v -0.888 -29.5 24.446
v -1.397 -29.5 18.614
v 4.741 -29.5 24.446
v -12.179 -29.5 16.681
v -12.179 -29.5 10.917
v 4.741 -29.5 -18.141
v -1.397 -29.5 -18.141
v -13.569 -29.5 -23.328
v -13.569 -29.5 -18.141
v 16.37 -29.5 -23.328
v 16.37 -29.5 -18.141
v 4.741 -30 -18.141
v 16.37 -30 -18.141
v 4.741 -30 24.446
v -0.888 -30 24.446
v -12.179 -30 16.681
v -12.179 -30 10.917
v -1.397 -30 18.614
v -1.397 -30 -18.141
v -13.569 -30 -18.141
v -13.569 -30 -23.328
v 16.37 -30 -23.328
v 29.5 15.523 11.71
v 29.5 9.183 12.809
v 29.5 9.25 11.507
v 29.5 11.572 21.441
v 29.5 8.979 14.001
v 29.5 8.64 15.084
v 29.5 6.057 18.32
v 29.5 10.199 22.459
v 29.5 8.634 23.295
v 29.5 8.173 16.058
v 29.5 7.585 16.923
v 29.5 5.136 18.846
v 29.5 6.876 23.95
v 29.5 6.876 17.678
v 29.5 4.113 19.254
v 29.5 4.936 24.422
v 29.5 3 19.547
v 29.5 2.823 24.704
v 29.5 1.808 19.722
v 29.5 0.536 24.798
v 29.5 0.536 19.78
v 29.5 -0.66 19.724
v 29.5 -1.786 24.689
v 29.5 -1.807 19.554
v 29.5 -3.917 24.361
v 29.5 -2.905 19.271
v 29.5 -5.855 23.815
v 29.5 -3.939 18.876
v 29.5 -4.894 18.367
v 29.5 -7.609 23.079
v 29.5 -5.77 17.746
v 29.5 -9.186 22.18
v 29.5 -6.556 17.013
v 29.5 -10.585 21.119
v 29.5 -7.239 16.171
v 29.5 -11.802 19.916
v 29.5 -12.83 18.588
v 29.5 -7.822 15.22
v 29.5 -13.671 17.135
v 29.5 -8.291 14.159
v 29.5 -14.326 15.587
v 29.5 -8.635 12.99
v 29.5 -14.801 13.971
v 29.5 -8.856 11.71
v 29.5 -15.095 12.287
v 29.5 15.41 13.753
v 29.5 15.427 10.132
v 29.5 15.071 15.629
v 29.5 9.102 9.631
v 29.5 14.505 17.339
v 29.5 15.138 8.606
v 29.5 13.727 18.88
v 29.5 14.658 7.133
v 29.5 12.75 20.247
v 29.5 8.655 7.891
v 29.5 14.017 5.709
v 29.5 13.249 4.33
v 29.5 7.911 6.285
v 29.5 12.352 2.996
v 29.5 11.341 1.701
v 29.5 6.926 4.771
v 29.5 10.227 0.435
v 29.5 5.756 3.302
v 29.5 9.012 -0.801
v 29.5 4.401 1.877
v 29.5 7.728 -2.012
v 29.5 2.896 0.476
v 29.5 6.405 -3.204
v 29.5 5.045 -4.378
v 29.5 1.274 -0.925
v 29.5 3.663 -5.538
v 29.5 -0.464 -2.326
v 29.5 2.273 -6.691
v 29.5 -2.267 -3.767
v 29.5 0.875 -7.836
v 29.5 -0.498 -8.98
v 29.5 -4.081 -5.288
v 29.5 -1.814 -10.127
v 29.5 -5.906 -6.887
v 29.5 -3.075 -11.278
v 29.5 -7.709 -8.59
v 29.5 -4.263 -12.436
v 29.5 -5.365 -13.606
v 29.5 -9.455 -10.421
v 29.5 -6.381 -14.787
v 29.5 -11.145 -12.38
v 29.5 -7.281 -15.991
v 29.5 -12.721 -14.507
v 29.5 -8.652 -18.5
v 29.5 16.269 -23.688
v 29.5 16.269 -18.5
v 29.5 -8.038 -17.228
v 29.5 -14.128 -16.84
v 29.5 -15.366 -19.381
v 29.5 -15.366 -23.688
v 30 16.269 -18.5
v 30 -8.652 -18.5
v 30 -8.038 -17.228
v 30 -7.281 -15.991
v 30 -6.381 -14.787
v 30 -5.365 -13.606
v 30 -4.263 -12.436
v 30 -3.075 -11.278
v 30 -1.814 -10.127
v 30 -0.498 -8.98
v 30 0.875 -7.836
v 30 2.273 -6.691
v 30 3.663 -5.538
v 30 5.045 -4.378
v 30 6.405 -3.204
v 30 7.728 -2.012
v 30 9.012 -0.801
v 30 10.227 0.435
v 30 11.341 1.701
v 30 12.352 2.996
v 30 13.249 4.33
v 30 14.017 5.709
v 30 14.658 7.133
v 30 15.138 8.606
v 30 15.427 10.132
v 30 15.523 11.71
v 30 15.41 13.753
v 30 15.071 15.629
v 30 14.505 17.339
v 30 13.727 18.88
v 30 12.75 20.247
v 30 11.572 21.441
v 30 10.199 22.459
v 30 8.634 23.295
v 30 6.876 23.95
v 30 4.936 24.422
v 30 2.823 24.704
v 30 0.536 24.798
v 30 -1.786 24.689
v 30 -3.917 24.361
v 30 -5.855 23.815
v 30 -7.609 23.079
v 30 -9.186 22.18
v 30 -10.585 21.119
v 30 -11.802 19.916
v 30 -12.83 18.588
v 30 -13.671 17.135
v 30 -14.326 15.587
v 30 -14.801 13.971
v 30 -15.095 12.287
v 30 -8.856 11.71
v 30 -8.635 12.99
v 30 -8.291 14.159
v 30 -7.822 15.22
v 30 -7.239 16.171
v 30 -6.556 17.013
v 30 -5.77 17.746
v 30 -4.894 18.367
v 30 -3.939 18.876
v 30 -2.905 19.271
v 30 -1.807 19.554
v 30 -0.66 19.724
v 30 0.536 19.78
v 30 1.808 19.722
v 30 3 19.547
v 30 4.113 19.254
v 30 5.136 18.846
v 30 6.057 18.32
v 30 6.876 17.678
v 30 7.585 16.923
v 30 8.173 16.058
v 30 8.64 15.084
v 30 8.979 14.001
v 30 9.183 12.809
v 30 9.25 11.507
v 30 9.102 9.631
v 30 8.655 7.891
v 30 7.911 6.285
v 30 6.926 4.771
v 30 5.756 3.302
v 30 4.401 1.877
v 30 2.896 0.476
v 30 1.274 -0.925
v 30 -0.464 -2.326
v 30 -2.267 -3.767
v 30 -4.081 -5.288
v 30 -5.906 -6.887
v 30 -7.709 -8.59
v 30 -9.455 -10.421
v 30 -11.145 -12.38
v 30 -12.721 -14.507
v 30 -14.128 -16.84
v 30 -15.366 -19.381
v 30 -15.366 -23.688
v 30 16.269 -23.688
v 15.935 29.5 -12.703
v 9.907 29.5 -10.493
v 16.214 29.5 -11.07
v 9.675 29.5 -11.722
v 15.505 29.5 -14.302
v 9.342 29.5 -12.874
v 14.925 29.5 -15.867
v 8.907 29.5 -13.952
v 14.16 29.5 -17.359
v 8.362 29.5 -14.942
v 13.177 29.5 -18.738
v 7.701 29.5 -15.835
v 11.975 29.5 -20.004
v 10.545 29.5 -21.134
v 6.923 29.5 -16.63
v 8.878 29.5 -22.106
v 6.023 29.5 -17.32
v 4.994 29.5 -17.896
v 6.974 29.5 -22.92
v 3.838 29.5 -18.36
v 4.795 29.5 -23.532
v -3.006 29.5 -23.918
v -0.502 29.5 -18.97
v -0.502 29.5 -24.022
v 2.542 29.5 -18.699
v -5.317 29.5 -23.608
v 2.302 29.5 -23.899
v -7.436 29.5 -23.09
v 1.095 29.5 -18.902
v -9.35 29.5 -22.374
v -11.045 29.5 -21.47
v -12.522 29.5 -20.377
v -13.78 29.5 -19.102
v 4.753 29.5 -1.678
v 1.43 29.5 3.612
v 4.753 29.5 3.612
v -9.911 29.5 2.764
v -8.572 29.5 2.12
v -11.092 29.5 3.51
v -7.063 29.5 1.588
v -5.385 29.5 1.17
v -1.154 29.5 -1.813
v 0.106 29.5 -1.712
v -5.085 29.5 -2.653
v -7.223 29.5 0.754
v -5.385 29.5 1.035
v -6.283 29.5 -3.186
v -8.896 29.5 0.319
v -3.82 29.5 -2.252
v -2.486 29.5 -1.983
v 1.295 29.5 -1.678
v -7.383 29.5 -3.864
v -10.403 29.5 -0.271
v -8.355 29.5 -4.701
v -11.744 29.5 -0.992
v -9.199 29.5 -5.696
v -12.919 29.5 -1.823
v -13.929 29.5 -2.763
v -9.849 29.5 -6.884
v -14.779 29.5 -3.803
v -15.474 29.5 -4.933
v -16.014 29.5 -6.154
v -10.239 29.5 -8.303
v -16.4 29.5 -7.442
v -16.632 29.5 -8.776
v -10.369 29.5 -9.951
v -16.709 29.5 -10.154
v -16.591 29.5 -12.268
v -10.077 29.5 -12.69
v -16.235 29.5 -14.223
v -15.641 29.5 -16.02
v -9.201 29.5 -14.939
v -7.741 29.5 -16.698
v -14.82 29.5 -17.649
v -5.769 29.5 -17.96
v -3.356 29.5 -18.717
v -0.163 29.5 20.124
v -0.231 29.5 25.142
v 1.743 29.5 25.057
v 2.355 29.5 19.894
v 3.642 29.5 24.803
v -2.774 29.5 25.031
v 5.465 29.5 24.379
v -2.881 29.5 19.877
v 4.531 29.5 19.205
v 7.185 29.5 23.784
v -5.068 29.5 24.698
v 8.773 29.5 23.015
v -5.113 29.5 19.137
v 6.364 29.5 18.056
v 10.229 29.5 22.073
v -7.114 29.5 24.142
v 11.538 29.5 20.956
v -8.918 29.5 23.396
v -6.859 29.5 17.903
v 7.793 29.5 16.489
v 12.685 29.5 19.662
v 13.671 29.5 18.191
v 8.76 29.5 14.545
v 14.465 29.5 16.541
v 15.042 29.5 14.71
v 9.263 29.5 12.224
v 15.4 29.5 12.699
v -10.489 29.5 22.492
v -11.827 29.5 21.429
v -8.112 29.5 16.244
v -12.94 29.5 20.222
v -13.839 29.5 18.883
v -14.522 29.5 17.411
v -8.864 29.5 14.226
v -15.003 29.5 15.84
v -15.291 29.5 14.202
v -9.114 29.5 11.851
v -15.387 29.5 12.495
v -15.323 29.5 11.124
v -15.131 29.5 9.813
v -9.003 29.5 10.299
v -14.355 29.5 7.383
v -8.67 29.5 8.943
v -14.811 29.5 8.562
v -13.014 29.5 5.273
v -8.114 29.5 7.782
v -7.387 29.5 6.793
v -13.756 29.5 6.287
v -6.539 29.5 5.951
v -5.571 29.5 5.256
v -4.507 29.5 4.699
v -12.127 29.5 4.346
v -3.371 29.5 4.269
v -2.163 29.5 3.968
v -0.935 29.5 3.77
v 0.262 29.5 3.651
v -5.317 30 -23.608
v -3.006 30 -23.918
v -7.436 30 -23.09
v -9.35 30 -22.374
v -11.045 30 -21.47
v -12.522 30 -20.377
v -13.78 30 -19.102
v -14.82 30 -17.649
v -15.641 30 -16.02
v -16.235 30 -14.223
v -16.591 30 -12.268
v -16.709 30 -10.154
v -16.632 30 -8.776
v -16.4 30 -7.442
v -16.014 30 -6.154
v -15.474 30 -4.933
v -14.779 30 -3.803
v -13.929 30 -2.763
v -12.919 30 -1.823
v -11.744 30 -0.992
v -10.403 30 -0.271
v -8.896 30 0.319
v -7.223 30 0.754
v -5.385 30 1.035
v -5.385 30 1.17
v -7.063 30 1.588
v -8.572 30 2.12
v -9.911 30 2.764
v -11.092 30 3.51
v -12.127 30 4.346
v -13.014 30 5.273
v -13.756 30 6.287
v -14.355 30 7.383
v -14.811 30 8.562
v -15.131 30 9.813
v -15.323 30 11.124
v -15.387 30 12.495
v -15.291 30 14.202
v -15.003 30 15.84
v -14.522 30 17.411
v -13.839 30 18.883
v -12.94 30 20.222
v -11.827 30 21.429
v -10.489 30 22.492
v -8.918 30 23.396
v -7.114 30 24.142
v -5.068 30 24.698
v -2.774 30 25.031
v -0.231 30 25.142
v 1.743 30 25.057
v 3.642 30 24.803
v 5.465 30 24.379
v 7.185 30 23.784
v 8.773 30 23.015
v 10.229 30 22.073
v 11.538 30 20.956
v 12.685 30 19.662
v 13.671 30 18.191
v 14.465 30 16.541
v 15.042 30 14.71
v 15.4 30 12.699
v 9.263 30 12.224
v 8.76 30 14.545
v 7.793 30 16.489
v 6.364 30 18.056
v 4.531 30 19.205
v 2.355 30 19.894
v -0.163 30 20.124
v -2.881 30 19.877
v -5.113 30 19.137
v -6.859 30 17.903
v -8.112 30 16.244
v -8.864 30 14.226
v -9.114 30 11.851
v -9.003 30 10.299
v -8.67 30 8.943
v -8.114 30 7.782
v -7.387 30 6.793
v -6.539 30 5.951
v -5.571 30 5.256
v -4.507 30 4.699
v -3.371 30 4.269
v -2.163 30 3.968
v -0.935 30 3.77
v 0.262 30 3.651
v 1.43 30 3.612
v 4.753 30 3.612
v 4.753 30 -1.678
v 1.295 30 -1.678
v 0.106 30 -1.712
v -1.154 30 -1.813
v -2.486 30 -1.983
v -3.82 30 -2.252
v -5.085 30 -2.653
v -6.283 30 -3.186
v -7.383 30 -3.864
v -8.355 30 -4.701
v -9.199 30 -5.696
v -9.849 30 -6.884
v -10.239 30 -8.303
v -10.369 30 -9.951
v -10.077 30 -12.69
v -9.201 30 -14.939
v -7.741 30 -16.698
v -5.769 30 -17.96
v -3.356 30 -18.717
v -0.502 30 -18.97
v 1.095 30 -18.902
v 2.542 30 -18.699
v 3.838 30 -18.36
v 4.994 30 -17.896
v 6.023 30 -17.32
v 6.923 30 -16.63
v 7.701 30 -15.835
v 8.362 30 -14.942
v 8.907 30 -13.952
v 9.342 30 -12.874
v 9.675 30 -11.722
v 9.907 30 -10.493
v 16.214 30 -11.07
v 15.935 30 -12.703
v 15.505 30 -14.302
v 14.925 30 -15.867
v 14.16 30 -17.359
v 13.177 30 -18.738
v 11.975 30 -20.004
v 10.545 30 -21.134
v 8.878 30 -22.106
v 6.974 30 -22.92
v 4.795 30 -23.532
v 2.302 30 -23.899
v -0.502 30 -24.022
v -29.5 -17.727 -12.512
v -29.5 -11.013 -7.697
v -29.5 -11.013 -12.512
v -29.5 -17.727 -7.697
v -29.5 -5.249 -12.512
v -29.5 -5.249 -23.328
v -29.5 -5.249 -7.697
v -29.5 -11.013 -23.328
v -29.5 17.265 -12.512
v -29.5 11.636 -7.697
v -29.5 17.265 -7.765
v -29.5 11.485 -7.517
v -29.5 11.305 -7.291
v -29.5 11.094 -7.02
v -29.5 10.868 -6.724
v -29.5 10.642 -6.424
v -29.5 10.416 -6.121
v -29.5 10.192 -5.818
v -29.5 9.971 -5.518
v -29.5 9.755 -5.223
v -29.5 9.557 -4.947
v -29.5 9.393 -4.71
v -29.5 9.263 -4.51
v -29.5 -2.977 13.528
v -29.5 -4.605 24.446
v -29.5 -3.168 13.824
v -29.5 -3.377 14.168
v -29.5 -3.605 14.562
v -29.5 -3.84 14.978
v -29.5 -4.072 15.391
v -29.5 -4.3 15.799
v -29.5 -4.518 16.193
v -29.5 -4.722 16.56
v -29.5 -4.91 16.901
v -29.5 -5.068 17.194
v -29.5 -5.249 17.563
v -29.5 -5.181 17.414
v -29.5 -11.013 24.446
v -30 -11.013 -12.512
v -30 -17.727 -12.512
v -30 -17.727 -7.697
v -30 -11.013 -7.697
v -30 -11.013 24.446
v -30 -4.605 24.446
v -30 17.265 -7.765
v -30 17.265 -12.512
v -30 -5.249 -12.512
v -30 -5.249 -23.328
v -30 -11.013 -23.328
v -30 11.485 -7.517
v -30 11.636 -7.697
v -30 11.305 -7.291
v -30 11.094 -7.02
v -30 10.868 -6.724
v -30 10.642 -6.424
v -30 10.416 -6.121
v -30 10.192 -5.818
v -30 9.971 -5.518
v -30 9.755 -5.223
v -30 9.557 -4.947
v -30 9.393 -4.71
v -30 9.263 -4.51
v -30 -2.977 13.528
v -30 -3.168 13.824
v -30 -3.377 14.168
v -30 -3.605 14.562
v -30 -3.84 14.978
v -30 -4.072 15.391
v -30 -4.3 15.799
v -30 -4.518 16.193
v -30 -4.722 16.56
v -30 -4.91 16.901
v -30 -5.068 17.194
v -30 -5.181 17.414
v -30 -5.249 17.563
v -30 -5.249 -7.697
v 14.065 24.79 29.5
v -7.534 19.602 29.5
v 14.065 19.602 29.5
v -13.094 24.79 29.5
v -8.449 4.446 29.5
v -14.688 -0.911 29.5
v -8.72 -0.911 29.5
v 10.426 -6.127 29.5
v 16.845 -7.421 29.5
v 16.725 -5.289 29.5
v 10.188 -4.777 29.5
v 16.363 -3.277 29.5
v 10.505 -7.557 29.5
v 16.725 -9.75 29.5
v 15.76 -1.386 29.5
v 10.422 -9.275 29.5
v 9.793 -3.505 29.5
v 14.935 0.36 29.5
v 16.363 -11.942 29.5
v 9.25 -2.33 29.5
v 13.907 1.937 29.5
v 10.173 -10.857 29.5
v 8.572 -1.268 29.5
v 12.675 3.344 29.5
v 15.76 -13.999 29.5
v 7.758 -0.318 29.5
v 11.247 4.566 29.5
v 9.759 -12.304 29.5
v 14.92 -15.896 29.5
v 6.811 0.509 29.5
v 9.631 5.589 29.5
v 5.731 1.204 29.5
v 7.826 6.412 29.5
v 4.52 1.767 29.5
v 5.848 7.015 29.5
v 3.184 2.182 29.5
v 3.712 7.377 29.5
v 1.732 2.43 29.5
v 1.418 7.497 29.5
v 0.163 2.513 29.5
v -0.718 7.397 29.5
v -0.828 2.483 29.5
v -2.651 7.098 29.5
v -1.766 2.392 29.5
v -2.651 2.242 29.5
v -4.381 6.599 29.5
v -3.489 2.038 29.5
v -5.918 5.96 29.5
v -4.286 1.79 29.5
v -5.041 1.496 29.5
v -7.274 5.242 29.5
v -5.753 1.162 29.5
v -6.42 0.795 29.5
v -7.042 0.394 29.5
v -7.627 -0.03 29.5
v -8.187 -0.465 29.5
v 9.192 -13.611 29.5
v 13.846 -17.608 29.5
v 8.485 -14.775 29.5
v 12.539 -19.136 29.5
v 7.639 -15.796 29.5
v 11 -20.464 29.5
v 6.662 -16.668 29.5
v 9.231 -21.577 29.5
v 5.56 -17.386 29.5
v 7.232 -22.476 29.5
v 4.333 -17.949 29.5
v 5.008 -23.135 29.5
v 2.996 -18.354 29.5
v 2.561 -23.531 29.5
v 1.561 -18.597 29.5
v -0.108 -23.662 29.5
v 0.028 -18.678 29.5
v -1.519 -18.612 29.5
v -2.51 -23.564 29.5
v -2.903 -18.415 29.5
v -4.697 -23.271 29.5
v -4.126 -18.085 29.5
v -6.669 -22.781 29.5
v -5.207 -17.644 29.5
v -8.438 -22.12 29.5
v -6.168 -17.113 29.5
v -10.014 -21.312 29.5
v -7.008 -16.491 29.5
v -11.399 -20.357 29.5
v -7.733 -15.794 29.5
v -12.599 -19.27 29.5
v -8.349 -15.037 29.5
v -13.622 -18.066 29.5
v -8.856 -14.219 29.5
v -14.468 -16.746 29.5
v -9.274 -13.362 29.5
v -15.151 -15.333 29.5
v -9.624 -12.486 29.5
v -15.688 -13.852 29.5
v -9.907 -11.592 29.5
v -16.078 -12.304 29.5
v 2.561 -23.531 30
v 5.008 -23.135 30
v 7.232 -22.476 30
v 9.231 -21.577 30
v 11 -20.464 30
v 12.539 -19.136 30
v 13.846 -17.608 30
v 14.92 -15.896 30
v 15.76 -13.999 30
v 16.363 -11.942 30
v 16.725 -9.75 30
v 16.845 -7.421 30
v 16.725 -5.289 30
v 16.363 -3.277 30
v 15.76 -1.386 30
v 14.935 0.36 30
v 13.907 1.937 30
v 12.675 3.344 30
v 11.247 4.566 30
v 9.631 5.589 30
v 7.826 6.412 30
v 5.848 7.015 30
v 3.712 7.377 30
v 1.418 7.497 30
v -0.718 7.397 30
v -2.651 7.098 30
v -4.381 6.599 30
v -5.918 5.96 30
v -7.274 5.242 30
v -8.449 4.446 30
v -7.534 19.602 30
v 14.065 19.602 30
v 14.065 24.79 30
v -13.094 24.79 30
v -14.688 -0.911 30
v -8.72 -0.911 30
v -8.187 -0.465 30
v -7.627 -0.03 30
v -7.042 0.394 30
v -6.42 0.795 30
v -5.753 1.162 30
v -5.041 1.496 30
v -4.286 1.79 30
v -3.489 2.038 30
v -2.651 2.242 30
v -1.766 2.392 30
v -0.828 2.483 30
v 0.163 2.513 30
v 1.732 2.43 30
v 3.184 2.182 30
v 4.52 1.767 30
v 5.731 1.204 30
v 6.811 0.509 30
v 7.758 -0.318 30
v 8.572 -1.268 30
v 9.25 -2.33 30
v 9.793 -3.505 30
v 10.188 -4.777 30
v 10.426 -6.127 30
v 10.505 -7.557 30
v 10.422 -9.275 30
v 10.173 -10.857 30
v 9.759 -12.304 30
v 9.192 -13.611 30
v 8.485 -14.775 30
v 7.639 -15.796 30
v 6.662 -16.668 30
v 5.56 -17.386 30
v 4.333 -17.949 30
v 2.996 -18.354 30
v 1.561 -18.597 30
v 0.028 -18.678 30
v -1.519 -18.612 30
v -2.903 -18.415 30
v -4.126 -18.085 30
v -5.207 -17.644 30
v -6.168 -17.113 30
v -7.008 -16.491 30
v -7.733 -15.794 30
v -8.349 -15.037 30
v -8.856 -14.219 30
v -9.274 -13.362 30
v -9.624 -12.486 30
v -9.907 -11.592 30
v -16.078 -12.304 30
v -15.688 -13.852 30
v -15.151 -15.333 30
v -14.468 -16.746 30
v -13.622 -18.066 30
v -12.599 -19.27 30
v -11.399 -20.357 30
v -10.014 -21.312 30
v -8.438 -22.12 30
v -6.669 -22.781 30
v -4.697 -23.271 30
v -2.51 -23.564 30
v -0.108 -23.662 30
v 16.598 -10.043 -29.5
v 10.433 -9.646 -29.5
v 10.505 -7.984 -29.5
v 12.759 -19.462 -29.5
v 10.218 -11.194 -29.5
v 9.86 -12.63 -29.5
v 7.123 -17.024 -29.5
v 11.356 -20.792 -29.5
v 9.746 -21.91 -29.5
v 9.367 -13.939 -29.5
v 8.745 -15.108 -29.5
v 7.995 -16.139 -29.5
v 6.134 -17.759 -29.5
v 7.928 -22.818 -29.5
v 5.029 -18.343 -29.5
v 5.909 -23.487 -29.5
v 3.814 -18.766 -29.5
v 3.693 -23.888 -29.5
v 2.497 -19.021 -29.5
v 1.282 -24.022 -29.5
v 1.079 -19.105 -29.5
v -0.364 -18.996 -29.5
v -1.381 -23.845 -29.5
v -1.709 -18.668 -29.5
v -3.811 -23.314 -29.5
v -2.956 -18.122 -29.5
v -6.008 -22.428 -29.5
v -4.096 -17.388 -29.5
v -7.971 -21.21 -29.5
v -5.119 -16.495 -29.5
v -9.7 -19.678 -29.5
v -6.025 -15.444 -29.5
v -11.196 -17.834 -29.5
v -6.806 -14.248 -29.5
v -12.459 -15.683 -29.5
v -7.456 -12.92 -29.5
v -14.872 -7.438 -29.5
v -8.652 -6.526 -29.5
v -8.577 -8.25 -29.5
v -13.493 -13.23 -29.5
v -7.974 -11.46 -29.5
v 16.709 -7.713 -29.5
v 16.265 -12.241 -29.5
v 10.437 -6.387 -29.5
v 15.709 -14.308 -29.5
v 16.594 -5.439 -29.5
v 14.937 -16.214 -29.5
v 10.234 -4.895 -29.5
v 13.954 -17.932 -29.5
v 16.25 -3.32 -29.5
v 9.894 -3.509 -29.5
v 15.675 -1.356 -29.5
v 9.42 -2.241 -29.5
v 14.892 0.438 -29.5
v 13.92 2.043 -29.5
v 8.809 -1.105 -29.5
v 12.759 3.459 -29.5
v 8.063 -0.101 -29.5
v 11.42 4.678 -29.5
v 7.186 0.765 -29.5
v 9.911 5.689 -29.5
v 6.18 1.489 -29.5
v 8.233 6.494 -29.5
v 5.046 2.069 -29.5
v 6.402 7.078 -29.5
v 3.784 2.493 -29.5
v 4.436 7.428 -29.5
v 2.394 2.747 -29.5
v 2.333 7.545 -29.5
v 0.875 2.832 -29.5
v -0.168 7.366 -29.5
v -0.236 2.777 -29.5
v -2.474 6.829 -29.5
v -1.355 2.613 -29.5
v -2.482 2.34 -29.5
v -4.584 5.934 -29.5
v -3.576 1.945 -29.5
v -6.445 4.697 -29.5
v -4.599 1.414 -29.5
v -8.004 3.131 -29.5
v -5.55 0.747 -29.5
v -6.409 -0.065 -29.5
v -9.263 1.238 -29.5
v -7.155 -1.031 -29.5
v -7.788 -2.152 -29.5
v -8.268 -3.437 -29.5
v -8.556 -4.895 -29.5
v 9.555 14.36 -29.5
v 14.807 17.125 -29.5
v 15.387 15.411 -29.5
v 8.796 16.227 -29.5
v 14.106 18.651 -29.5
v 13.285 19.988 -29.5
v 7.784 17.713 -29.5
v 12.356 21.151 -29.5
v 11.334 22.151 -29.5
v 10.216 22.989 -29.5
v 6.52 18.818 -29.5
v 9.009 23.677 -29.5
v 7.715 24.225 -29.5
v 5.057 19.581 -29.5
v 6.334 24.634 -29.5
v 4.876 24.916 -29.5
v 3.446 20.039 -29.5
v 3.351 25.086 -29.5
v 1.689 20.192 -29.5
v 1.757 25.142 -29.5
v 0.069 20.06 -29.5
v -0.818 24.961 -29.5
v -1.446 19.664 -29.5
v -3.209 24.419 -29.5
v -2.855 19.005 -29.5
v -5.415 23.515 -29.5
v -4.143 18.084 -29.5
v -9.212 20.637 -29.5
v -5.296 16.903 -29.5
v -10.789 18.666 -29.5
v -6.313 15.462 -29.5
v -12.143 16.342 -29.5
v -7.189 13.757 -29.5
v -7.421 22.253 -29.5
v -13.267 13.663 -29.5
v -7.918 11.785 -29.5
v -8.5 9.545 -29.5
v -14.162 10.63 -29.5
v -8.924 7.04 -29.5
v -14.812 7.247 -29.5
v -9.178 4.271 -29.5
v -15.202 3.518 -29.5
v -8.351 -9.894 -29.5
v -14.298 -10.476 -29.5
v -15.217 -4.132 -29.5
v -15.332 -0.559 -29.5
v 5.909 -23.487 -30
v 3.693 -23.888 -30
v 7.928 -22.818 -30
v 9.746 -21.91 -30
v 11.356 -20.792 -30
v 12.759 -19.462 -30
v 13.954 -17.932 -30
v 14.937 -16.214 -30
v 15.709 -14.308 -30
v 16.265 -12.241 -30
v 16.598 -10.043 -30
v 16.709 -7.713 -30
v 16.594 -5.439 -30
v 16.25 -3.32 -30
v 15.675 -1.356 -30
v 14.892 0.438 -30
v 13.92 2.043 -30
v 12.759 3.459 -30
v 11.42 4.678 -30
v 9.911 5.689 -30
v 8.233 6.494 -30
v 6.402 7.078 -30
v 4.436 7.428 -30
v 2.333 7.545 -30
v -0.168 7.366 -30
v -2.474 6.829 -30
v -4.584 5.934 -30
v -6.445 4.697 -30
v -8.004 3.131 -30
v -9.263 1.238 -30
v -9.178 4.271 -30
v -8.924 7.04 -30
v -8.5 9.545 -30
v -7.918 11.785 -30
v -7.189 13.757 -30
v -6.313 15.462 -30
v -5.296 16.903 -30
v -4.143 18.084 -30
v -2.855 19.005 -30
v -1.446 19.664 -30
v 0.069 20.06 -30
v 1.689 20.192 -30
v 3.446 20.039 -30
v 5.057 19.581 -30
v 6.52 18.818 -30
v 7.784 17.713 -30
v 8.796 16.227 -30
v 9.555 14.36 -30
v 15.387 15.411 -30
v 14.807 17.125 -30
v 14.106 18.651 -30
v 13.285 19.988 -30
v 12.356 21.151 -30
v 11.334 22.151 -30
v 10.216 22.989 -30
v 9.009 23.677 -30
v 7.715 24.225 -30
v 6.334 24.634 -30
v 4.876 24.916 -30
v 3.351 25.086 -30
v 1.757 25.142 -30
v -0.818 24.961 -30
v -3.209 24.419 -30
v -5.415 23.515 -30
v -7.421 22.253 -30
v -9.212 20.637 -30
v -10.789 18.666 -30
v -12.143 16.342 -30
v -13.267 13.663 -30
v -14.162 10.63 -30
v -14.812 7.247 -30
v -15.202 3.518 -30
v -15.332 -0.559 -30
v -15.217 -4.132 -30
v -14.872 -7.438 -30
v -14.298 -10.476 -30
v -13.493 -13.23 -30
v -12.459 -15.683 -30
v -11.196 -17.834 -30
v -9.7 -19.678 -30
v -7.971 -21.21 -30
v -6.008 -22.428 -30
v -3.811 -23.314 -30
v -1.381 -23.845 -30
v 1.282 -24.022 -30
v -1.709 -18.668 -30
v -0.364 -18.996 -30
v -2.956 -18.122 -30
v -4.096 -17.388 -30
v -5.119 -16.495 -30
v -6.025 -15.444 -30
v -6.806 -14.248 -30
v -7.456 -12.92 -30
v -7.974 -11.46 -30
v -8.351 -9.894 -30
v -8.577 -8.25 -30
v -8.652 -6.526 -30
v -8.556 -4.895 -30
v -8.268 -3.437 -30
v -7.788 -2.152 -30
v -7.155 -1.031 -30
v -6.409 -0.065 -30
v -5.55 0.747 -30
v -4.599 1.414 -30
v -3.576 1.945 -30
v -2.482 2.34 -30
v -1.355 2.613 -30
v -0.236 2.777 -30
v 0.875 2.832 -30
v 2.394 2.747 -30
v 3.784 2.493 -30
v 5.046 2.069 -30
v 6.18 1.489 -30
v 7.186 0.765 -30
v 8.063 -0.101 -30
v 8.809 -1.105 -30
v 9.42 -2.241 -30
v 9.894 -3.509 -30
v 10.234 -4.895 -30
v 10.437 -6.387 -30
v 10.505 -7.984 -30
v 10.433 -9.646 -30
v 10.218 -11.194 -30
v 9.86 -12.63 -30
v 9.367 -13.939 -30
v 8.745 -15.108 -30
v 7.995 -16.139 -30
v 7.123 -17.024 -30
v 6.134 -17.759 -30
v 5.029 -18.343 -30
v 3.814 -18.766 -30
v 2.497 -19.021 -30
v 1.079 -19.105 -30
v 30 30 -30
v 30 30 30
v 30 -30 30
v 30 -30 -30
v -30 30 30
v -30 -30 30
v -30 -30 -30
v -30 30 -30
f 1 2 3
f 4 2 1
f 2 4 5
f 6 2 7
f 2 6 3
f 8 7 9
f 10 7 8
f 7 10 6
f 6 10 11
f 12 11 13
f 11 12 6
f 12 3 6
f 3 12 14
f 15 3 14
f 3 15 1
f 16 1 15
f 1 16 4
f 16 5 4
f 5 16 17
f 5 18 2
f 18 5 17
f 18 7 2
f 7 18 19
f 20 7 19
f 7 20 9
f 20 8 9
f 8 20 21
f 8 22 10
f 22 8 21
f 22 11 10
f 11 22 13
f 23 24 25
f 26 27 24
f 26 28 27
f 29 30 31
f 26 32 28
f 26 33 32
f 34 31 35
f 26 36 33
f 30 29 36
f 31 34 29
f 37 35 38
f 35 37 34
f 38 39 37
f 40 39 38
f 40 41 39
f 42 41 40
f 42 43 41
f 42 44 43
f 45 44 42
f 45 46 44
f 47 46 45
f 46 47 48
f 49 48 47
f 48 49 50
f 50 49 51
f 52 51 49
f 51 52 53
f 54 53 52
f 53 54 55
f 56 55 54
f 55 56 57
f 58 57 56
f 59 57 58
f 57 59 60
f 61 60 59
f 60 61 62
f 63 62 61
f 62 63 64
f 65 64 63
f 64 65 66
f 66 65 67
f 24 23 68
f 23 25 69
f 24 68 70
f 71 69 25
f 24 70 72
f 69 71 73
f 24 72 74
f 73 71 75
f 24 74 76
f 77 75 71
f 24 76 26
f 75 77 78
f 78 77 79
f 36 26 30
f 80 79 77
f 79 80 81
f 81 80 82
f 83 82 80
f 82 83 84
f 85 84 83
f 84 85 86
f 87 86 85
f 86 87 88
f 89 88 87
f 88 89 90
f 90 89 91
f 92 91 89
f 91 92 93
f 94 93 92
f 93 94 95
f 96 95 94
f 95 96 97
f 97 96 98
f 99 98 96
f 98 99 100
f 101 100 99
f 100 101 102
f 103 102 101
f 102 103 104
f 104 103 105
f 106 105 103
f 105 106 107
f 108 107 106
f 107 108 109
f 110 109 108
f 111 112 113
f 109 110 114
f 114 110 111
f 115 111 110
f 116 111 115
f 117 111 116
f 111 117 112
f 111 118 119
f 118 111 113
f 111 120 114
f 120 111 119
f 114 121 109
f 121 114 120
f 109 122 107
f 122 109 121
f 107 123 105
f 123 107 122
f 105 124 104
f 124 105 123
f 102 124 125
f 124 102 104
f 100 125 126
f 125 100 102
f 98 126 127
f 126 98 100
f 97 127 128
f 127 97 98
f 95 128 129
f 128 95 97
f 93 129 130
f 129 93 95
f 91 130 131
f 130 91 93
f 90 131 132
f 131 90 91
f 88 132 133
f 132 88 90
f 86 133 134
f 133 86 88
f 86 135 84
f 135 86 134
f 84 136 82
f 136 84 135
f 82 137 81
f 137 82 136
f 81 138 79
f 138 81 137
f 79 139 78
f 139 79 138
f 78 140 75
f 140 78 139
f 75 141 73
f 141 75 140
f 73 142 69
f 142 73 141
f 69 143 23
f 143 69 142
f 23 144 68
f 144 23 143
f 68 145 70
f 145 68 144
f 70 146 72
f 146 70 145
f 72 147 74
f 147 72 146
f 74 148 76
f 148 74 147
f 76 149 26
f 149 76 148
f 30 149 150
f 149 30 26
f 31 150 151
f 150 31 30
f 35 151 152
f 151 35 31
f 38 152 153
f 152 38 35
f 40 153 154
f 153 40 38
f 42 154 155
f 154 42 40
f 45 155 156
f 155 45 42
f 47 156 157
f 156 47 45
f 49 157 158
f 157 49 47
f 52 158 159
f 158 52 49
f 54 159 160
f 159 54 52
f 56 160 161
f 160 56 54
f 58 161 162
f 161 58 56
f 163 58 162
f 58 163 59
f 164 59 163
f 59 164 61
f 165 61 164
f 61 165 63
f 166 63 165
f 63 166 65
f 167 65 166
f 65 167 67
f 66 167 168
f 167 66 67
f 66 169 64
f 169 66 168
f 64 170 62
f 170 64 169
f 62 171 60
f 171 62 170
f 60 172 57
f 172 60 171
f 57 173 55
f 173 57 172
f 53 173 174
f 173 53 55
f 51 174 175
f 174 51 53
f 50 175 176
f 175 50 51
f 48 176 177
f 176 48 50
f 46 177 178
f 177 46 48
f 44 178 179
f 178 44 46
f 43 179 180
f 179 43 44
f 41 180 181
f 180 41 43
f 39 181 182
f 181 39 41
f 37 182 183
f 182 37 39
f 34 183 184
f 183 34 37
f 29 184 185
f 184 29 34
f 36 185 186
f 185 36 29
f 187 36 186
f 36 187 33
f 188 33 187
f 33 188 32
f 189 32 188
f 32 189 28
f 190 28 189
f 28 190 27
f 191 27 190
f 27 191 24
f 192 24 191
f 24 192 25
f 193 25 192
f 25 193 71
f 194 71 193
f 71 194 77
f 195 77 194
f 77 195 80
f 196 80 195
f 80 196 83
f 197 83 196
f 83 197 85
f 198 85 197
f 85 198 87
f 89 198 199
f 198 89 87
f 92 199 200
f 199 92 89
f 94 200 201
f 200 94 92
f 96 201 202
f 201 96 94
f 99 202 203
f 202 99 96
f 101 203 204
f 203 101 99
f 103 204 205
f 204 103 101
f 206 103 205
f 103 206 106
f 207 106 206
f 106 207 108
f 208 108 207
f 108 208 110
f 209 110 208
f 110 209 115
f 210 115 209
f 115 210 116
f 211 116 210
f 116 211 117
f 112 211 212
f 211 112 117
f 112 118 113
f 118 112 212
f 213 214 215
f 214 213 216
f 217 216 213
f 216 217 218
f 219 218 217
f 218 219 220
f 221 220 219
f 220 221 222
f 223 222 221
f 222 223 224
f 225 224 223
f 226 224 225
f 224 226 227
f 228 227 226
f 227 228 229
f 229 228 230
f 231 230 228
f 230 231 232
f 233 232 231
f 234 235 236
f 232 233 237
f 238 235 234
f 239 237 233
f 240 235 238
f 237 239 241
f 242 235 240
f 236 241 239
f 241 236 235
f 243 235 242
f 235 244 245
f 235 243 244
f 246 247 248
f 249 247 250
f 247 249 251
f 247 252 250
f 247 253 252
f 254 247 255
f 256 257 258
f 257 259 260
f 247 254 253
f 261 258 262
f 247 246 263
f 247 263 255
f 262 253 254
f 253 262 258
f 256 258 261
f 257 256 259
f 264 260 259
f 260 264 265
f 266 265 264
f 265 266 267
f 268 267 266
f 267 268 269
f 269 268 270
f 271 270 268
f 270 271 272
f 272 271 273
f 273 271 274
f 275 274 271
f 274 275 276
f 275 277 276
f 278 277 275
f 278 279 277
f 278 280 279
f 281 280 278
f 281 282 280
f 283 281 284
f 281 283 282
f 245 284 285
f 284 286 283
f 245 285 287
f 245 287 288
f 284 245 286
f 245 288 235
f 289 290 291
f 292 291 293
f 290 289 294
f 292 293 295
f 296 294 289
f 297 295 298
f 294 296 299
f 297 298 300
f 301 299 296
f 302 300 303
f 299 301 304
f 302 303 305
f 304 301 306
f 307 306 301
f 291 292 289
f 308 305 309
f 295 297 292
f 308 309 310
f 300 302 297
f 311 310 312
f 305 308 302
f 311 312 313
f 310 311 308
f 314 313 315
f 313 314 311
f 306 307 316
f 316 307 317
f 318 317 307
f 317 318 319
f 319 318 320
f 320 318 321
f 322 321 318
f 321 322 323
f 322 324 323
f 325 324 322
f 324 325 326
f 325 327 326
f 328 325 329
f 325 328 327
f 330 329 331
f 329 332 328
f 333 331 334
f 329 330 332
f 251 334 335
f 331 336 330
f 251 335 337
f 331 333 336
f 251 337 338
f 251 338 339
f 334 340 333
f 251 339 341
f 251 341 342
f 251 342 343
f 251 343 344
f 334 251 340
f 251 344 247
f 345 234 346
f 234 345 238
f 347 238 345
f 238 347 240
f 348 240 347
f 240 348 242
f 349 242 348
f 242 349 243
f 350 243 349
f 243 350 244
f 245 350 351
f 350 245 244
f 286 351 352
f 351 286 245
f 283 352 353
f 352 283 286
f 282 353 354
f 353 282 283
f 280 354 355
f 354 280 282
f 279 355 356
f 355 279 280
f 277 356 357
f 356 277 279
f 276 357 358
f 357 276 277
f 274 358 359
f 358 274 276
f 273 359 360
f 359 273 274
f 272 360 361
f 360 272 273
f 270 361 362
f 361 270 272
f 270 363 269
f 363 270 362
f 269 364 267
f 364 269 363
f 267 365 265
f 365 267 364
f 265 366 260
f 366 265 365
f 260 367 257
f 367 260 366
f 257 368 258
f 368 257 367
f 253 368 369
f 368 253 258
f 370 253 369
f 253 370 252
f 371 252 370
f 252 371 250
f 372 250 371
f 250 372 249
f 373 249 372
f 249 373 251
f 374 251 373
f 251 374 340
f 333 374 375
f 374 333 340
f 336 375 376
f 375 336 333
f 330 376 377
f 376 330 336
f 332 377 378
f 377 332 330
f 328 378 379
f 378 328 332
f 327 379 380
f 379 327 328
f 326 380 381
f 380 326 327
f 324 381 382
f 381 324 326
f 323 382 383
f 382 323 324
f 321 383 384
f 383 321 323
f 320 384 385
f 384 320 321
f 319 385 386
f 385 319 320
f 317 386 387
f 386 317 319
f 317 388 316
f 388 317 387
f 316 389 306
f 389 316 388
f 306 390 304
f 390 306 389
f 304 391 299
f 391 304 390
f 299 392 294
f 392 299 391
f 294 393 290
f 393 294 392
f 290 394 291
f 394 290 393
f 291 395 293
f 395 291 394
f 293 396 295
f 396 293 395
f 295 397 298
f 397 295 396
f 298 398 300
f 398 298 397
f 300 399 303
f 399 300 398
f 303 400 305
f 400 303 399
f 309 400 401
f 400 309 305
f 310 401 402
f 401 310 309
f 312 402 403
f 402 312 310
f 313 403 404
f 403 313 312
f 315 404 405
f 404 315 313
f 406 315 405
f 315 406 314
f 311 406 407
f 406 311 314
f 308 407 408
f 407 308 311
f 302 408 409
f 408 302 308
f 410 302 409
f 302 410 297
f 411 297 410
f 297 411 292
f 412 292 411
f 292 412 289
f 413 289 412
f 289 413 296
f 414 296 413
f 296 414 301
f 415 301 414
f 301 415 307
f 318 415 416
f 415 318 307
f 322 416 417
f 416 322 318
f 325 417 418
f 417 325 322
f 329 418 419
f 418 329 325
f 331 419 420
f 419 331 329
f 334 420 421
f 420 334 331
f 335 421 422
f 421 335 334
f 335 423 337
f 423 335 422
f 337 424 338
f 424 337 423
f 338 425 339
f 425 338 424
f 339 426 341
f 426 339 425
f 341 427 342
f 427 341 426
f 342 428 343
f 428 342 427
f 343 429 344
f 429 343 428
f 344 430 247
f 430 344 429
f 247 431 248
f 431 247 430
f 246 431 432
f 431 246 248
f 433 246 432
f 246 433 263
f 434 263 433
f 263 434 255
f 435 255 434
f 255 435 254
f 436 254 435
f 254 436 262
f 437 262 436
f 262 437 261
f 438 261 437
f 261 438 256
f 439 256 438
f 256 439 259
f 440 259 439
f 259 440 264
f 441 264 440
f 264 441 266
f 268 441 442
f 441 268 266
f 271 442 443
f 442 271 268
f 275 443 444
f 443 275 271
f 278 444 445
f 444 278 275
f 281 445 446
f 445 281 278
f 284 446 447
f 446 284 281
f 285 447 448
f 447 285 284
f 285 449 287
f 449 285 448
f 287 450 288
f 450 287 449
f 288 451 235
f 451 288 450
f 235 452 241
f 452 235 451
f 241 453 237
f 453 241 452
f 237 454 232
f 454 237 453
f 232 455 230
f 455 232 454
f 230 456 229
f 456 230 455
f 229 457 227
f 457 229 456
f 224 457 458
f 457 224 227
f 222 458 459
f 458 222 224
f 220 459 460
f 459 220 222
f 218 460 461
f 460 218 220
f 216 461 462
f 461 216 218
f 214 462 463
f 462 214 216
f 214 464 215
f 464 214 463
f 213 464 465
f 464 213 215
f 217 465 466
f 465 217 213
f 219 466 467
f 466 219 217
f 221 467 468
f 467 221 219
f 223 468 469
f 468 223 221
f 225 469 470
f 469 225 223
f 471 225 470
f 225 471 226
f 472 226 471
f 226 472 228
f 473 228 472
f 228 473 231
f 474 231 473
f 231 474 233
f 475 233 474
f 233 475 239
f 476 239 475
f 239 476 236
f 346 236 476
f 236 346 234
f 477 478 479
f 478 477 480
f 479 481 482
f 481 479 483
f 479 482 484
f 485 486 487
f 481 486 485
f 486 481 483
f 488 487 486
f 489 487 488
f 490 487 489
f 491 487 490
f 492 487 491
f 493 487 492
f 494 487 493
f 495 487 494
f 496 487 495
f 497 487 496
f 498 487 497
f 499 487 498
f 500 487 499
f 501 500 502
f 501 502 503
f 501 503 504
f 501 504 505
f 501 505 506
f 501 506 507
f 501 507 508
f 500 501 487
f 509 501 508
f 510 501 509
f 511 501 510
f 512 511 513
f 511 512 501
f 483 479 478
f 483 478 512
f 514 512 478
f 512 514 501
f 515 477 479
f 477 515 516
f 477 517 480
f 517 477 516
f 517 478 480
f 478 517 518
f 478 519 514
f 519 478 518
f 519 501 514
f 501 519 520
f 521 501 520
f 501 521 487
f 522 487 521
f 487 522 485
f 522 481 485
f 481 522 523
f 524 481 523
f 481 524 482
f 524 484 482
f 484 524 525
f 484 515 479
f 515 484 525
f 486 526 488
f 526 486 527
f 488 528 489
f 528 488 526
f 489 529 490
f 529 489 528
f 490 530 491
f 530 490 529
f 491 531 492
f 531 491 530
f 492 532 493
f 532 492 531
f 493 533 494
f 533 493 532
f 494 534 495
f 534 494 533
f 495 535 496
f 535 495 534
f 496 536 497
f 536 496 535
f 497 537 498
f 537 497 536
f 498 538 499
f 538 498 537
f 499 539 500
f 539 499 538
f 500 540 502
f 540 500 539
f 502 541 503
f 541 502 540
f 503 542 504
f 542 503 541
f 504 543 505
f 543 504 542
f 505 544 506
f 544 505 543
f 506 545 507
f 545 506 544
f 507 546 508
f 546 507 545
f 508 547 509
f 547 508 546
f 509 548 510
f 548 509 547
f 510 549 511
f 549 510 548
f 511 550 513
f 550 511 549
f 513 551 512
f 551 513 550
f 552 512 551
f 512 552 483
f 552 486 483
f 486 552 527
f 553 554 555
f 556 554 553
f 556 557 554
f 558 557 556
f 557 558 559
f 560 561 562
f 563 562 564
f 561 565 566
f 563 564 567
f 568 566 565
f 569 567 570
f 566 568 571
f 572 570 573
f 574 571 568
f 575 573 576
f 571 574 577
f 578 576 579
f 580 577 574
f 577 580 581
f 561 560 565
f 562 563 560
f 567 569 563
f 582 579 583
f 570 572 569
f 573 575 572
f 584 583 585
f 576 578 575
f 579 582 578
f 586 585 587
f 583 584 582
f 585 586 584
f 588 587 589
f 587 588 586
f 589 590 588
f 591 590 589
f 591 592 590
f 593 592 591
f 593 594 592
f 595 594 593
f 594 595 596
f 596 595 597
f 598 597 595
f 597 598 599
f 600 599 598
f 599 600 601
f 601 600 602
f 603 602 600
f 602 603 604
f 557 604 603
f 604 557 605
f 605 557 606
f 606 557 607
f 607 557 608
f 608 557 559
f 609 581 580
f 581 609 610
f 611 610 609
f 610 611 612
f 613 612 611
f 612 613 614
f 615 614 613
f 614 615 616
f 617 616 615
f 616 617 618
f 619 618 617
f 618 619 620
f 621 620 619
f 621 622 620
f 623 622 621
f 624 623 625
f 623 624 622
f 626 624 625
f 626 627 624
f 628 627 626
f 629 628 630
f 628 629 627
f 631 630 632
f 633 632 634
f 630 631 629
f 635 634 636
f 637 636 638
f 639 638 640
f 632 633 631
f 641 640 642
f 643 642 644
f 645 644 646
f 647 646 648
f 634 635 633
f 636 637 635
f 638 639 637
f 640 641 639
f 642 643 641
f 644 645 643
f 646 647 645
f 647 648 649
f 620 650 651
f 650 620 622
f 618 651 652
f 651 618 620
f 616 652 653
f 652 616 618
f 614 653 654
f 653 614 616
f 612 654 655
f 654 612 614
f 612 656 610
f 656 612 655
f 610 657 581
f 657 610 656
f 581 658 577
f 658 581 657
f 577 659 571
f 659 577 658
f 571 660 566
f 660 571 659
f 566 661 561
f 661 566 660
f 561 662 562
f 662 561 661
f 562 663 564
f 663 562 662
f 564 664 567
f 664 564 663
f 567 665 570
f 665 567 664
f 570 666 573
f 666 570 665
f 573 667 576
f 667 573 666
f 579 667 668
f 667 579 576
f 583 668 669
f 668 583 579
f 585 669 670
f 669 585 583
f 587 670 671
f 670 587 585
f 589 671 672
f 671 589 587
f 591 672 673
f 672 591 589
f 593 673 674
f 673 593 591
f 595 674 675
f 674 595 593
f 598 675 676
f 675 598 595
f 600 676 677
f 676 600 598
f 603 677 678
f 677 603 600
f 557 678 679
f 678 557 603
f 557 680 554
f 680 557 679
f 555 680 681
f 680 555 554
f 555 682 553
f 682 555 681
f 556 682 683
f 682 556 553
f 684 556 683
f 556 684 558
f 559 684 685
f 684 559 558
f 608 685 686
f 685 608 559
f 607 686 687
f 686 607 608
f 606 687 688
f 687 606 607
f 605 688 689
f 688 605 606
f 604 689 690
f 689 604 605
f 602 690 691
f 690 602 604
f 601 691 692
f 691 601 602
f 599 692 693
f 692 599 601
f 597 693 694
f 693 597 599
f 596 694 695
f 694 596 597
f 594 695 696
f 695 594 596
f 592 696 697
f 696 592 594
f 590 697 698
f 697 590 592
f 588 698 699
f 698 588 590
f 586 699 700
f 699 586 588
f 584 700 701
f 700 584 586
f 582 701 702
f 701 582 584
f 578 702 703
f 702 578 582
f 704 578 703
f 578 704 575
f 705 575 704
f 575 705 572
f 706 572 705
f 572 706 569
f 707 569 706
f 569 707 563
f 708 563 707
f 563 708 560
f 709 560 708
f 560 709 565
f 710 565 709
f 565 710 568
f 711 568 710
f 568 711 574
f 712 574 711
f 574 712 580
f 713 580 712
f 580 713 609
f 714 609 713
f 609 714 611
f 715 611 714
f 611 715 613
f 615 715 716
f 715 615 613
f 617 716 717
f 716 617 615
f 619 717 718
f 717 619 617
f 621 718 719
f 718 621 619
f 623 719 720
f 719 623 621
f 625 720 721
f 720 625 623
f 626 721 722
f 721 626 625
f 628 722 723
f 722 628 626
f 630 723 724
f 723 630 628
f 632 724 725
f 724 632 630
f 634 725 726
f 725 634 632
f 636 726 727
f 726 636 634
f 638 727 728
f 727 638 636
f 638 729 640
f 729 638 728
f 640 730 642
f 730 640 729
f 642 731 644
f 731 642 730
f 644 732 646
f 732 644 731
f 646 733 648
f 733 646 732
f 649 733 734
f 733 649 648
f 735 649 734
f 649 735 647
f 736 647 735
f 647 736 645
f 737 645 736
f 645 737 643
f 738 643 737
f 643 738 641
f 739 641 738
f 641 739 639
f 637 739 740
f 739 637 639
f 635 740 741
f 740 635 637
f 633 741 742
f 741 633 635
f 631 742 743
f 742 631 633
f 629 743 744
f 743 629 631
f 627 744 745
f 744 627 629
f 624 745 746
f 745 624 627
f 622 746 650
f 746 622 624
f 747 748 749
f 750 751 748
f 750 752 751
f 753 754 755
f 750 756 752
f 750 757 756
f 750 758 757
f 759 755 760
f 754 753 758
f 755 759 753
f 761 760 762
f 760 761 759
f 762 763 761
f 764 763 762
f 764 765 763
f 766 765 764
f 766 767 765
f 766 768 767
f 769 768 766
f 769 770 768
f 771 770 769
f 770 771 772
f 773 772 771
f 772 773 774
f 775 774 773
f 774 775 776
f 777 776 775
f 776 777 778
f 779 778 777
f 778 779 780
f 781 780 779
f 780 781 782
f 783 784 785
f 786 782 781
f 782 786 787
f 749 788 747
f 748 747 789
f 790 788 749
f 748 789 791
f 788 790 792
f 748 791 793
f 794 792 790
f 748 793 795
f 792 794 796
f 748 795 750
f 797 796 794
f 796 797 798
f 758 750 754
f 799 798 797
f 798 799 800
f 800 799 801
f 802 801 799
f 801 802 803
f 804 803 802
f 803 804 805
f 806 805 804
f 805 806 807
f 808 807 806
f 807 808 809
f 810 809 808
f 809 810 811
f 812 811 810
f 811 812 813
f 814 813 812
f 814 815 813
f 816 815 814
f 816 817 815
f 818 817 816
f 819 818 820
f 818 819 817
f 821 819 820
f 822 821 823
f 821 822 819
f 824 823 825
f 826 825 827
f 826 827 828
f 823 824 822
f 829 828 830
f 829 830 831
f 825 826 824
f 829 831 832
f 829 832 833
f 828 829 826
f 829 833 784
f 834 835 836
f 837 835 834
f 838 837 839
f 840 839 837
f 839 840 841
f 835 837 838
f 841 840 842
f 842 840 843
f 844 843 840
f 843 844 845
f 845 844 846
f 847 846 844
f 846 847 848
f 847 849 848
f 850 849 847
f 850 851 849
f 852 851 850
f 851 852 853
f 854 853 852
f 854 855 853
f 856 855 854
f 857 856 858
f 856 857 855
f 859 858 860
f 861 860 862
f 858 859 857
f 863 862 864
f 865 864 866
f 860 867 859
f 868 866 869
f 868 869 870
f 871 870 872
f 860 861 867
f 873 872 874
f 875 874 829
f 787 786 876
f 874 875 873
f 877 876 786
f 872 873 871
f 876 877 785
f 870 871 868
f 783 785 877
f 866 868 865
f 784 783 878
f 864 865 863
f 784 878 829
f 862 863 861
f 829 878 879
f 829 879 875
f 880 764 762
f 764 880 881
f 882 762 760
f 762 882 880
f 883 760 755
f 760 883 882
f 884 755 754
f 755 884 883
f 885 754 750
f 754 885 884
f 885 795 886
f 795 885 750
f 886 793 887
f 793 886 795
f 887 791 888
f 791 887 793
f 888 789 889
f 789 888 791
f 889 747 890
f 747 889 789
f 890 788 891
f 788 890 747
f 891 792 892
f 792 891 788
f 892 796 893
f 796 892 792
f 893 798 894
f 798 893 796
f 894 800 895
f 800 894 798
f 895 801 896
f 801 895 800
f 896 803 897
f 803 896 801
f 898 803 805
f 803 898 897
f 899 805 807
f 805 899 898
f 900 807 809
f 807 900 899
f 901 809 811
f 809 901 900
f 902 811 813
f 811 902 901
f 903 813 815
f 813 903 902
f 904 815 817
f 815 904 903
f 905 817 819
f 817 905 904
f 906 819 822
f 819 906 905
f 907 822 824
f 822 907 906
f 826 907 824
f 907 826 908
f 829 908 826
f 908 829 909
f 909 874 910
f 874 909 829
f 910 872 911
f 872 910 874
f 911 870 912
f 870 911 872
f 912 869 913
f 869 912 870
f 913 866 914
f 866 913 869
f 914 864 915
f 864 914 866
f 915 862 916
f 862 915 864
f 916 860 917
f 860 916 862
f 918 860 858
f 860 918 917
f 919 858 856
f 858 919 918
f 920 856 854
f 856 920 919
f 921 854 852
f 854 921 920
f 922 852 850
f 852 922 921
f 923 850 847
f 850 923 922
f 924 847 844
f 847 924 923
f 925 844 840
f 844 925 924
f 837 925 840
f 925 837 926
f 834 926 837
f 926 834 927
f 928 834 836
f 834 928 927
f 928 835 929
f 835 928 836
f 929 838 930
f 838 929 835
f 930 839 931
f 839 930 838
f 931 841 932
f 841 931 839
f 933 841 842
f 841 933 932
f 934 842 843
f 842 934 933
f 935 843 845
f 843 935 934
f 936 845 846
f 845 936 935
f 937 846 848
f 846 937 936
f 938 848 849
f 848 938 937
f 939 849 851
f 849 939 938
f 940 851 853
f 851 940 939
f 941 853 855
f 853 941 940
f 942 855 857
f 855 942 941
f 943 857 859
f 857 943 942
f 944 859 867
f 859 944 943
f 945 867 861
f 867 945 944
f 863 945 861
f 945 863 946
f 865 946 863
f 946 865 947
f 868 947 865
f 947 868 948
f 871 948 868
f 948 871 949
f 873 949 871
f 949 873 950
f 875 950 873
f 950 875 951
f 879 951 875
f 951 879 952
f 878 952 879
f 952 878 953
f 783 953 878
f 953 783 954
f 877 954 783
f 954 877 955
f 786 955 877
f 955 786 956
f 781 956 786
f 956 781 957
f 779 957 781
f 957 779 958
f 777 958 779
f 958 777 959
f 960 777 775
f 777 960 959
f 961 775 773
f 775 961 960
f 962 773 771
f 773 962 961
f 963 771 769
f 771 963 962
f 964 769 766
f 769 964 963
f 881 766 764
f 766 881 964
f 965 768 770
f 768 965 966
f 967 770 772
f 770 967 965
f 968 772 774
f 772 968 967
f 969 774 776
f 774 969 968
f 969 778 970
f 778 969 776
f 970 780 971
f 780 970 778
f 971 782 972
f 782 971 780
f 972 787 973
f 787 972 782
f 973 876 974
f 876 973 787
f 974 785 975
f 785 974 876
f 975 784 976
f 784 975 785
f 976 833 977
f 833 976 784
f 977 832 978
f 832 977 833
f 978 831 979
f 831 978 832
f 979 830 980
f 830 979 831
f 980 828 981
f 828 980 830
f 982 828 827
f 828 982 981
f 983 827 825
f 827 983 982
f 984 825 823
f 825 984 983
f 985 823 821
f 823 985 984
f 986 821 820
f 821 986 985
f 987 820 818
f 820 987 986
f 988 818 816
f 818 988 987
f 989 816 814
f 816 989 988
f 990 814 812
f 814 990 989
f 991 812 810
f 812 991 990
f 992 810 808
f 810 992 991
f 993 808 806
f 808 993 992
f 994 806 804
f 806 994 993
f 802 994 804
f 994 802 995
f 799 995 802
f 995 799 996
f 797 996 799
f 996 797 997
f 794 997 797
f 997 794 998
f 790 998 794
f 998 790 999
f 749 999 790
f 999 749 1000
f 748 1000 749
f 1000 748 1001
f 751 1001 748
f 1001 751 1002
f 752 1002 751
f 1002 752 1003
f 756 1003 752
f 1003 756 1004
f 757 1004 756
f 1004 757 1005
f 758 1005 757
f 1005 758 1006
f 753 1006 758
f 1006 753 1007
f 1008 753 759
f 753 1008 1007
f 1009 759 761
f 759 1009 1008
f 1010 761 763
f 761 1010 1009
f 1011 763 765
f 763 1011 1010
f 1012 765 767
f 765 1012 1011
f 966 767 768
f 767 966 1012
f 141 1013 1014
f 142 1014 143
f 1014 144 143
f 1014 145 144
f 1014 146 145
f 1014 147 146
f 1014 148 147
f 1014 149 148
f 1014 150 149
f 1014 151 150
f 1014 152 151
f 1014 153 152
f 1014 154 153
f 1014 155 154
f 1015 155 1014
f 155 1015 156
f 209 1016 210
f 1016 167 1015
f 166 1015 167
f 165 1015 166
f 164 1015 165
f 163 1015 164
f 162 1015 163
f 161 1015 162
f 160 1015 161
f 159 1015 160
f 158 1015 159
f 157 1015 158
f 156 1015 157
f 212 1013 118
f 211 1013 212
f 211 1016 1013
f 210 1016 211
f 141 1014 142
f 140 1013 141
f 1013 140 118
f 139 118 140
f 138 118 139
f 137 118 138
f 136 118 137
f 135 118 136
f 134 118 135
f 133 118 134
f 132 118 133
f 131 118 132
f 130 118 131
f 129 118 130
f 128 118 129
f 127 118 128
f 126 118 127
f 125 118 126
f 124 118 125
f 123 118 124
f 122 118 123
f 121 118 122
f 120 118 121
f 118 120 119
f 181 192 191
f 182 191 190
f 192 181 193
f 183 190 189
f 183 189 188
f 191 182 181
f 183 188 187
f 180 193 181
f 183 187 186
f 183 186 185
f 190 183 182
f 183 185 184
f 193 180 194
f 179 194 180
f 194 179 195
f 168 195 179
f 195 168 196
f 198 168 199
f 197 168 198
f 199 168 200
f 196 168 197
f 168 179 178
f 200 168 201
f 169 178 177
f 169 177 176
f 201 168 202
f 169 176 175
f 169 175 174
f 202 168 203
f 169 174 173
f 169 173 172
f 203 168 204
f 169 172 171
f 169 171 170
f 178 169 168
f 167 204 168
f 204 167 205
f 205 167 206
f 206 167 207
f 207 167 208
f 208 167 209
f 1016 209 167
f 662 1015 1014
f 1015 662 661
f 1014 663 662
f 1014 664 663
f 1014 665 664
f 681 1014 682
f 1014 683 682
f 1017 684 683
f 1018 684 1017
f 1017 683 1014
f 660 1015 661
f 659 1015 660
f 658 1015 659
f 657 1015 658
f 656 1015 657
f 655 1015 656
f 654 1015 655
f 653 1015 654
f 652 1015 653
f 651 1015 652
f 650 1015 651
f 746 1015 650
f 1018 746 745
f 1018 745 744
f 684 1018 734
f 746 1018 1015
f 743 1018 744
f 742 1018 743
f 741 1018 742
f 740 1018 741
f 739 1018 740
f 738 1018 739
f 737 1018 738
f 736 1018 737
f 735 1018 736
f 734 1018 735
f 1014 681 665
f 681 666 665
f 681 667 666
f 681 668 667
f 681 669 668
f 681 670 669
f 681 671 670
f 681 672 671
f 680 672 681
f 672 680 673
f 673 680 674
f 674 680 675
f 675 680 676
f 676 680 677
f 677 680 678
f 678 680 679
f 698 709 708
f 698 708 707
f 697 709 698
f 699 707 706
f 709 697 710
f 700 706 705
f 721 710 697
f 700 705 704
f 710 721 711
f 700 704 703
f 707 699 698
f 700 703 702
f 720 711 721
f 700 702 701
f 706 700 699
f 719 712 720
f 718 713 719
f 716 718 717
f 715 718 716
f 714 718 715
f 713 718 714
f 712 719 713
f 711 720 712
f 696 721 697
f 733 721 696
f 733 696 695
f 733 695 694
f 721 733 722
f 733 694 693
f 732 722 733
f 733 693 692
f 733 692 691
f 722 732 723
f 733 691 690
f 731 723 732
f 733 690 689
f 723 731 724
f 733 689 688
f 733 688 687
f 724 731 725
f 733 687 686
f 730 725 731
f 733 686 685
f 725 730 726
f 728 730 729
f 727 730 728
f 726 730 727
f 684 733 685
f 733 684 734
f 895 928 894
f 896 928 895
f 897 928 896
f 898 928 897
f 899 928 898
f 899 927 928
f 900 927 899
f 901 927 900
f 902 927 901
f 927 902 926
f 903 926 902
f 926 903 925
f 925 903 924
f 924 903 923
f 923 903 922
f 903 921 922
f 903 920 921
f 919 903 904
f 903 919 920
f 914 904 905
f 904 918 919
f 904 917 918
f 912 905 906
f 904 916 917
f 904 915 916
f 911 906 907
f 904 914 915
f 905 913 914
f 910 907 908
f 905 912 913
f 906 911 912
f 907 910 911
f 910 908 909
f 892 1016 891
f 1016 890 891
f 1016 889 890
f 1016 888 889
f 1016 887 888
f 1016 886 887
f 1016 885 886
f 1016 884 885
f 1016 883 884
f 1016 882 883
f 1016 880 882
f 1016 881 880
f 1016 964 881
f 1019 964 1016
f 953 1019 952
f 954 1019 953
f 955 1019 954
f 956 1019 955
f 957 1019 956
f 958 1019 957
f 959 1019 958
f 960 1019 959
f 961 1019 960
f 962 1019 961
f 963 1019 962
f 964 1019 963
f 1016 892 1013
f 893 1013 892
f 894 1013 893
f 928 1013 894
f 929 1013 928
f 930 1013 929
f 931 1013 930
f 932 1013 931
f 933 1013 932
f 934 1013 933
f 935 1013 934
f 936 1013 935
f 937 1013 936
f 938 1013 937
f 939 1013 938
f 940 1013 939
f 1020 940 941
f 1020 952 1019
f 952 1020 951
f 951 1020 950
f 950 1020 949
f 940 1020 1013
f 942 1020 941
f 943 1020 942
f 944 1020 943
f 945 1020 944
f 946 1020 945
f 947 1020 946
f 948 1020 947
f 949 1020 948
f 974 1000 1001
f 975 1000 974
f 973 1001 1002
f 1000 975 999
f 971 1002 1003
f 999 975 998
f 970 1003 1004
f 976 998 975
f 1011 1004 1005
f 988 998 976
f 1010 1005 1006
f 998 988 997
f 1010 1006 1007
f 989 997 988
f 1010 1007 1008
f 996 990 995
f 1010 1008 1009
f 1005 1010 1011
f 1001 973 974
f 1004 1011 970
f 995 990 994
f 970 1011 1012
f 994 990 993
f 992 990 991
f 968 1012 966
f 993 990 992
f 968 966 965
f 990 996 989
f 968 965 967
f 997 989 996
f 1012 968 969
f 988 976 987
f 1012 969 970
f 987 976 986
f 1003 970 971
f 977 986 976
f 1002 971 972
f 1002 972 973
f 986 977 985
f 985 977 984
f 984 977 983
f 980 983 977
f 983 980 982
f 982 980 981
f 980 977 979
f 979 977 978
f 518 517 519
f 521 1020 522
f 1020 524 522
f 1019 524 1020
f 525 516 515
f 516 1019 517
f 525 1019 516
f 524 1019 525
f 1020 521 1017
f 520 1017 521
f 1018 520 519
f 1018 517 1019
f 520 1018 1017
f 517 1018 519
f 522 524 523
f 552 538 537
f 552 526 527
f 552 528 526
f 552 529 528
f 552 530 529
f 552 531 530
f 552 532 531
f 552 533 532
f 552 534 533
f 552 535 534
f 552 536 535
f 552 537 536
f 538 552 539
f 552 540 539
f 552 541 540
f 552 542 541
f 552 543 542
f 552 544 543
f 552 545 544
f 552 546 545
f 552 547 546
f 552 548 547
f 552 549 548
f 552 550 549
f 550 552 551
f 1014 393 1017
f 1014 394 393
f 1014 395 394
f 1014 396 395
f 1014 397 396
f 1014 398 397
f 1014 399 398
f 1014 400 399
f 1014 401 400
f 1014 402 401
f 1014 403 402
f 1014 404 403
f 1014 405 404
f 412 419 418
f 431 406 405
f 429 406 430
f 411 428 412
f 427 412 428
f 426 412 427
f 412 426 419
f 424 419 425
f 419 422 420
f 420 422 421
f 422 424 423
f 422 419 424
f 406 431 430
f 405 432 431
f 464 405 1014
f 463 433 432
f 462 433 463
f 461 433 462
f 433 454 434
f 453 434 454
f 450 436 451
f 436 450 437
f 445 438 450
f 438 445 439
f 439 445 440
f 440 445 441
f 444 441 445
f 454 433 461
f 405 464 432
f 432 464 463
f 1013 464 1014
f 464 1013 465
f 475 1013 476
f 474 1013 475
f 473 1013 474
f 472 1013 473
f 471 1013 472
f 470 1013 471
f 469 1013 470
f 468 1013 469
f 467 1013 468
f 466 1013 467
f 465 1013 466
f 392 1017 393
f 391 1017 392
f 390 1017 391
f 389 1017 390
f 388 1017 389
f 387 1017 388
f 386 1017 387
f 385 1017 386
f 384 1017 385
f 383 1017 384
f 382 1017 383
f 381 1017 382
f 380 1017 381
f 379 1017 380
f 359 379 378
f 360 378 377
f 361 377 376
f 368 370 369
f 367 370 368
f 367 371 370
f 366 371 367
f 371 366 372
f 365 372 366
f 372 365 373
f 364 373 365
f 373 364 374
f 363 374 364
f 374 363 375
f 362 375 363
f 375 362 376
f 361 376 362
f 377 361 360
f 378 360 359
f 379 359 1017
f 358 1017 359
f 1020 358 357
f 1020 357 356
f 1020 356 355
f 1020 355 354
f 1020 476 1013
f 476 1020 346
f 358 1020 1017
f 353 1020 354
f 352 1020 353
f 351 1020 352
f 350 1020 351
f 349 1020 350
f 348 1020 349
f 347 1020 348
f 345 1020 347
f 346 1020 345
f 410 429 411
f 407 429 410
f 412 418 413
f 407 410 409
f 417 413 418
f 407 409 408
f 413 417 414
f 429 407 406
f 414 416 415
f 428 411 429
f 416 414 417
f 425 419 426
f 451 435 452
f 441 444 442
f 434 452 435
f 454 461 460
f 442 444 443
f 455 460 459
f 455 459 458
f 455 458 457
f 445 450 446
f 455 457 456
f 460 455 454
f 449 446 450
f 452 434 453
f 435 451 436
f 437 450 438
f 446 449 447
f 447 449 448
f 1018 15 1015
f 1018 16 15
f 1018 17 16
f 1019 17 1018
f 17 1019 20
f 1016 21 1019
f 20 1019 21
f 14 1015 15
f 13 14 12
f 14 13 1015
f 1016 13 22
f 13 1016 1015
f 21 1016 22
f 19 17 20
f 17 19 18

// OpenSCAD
font = "Liberation Sans";

cube_size = 60;
letter_size = 50;
letter_height = 1;

o = cube_size/2 - letter_height/2;

module letter(l)
{
	linear_extrude(height=letter_height)
	{
		text(l, size=letter_size, font=font,
				halign="center", valign="center", $fn=16);
	}
}

difference()
{
	color("white")cube(cube_size, center=true);
	color("black")
	{
		translate([0,-o,0])rotate([90,0,0])letter("1");
		translate([o,0,0])rotate([90,0,90])letter("2");
		translate([0,o,0])rotate([90,0,180])letter("3");
		translate([-o,0,0])rotate([90,0,-90])letter("4");
		translate([0,0,o])letter("5");
		translate([0,0,-o - letter_height])letter("6");
	}
}
